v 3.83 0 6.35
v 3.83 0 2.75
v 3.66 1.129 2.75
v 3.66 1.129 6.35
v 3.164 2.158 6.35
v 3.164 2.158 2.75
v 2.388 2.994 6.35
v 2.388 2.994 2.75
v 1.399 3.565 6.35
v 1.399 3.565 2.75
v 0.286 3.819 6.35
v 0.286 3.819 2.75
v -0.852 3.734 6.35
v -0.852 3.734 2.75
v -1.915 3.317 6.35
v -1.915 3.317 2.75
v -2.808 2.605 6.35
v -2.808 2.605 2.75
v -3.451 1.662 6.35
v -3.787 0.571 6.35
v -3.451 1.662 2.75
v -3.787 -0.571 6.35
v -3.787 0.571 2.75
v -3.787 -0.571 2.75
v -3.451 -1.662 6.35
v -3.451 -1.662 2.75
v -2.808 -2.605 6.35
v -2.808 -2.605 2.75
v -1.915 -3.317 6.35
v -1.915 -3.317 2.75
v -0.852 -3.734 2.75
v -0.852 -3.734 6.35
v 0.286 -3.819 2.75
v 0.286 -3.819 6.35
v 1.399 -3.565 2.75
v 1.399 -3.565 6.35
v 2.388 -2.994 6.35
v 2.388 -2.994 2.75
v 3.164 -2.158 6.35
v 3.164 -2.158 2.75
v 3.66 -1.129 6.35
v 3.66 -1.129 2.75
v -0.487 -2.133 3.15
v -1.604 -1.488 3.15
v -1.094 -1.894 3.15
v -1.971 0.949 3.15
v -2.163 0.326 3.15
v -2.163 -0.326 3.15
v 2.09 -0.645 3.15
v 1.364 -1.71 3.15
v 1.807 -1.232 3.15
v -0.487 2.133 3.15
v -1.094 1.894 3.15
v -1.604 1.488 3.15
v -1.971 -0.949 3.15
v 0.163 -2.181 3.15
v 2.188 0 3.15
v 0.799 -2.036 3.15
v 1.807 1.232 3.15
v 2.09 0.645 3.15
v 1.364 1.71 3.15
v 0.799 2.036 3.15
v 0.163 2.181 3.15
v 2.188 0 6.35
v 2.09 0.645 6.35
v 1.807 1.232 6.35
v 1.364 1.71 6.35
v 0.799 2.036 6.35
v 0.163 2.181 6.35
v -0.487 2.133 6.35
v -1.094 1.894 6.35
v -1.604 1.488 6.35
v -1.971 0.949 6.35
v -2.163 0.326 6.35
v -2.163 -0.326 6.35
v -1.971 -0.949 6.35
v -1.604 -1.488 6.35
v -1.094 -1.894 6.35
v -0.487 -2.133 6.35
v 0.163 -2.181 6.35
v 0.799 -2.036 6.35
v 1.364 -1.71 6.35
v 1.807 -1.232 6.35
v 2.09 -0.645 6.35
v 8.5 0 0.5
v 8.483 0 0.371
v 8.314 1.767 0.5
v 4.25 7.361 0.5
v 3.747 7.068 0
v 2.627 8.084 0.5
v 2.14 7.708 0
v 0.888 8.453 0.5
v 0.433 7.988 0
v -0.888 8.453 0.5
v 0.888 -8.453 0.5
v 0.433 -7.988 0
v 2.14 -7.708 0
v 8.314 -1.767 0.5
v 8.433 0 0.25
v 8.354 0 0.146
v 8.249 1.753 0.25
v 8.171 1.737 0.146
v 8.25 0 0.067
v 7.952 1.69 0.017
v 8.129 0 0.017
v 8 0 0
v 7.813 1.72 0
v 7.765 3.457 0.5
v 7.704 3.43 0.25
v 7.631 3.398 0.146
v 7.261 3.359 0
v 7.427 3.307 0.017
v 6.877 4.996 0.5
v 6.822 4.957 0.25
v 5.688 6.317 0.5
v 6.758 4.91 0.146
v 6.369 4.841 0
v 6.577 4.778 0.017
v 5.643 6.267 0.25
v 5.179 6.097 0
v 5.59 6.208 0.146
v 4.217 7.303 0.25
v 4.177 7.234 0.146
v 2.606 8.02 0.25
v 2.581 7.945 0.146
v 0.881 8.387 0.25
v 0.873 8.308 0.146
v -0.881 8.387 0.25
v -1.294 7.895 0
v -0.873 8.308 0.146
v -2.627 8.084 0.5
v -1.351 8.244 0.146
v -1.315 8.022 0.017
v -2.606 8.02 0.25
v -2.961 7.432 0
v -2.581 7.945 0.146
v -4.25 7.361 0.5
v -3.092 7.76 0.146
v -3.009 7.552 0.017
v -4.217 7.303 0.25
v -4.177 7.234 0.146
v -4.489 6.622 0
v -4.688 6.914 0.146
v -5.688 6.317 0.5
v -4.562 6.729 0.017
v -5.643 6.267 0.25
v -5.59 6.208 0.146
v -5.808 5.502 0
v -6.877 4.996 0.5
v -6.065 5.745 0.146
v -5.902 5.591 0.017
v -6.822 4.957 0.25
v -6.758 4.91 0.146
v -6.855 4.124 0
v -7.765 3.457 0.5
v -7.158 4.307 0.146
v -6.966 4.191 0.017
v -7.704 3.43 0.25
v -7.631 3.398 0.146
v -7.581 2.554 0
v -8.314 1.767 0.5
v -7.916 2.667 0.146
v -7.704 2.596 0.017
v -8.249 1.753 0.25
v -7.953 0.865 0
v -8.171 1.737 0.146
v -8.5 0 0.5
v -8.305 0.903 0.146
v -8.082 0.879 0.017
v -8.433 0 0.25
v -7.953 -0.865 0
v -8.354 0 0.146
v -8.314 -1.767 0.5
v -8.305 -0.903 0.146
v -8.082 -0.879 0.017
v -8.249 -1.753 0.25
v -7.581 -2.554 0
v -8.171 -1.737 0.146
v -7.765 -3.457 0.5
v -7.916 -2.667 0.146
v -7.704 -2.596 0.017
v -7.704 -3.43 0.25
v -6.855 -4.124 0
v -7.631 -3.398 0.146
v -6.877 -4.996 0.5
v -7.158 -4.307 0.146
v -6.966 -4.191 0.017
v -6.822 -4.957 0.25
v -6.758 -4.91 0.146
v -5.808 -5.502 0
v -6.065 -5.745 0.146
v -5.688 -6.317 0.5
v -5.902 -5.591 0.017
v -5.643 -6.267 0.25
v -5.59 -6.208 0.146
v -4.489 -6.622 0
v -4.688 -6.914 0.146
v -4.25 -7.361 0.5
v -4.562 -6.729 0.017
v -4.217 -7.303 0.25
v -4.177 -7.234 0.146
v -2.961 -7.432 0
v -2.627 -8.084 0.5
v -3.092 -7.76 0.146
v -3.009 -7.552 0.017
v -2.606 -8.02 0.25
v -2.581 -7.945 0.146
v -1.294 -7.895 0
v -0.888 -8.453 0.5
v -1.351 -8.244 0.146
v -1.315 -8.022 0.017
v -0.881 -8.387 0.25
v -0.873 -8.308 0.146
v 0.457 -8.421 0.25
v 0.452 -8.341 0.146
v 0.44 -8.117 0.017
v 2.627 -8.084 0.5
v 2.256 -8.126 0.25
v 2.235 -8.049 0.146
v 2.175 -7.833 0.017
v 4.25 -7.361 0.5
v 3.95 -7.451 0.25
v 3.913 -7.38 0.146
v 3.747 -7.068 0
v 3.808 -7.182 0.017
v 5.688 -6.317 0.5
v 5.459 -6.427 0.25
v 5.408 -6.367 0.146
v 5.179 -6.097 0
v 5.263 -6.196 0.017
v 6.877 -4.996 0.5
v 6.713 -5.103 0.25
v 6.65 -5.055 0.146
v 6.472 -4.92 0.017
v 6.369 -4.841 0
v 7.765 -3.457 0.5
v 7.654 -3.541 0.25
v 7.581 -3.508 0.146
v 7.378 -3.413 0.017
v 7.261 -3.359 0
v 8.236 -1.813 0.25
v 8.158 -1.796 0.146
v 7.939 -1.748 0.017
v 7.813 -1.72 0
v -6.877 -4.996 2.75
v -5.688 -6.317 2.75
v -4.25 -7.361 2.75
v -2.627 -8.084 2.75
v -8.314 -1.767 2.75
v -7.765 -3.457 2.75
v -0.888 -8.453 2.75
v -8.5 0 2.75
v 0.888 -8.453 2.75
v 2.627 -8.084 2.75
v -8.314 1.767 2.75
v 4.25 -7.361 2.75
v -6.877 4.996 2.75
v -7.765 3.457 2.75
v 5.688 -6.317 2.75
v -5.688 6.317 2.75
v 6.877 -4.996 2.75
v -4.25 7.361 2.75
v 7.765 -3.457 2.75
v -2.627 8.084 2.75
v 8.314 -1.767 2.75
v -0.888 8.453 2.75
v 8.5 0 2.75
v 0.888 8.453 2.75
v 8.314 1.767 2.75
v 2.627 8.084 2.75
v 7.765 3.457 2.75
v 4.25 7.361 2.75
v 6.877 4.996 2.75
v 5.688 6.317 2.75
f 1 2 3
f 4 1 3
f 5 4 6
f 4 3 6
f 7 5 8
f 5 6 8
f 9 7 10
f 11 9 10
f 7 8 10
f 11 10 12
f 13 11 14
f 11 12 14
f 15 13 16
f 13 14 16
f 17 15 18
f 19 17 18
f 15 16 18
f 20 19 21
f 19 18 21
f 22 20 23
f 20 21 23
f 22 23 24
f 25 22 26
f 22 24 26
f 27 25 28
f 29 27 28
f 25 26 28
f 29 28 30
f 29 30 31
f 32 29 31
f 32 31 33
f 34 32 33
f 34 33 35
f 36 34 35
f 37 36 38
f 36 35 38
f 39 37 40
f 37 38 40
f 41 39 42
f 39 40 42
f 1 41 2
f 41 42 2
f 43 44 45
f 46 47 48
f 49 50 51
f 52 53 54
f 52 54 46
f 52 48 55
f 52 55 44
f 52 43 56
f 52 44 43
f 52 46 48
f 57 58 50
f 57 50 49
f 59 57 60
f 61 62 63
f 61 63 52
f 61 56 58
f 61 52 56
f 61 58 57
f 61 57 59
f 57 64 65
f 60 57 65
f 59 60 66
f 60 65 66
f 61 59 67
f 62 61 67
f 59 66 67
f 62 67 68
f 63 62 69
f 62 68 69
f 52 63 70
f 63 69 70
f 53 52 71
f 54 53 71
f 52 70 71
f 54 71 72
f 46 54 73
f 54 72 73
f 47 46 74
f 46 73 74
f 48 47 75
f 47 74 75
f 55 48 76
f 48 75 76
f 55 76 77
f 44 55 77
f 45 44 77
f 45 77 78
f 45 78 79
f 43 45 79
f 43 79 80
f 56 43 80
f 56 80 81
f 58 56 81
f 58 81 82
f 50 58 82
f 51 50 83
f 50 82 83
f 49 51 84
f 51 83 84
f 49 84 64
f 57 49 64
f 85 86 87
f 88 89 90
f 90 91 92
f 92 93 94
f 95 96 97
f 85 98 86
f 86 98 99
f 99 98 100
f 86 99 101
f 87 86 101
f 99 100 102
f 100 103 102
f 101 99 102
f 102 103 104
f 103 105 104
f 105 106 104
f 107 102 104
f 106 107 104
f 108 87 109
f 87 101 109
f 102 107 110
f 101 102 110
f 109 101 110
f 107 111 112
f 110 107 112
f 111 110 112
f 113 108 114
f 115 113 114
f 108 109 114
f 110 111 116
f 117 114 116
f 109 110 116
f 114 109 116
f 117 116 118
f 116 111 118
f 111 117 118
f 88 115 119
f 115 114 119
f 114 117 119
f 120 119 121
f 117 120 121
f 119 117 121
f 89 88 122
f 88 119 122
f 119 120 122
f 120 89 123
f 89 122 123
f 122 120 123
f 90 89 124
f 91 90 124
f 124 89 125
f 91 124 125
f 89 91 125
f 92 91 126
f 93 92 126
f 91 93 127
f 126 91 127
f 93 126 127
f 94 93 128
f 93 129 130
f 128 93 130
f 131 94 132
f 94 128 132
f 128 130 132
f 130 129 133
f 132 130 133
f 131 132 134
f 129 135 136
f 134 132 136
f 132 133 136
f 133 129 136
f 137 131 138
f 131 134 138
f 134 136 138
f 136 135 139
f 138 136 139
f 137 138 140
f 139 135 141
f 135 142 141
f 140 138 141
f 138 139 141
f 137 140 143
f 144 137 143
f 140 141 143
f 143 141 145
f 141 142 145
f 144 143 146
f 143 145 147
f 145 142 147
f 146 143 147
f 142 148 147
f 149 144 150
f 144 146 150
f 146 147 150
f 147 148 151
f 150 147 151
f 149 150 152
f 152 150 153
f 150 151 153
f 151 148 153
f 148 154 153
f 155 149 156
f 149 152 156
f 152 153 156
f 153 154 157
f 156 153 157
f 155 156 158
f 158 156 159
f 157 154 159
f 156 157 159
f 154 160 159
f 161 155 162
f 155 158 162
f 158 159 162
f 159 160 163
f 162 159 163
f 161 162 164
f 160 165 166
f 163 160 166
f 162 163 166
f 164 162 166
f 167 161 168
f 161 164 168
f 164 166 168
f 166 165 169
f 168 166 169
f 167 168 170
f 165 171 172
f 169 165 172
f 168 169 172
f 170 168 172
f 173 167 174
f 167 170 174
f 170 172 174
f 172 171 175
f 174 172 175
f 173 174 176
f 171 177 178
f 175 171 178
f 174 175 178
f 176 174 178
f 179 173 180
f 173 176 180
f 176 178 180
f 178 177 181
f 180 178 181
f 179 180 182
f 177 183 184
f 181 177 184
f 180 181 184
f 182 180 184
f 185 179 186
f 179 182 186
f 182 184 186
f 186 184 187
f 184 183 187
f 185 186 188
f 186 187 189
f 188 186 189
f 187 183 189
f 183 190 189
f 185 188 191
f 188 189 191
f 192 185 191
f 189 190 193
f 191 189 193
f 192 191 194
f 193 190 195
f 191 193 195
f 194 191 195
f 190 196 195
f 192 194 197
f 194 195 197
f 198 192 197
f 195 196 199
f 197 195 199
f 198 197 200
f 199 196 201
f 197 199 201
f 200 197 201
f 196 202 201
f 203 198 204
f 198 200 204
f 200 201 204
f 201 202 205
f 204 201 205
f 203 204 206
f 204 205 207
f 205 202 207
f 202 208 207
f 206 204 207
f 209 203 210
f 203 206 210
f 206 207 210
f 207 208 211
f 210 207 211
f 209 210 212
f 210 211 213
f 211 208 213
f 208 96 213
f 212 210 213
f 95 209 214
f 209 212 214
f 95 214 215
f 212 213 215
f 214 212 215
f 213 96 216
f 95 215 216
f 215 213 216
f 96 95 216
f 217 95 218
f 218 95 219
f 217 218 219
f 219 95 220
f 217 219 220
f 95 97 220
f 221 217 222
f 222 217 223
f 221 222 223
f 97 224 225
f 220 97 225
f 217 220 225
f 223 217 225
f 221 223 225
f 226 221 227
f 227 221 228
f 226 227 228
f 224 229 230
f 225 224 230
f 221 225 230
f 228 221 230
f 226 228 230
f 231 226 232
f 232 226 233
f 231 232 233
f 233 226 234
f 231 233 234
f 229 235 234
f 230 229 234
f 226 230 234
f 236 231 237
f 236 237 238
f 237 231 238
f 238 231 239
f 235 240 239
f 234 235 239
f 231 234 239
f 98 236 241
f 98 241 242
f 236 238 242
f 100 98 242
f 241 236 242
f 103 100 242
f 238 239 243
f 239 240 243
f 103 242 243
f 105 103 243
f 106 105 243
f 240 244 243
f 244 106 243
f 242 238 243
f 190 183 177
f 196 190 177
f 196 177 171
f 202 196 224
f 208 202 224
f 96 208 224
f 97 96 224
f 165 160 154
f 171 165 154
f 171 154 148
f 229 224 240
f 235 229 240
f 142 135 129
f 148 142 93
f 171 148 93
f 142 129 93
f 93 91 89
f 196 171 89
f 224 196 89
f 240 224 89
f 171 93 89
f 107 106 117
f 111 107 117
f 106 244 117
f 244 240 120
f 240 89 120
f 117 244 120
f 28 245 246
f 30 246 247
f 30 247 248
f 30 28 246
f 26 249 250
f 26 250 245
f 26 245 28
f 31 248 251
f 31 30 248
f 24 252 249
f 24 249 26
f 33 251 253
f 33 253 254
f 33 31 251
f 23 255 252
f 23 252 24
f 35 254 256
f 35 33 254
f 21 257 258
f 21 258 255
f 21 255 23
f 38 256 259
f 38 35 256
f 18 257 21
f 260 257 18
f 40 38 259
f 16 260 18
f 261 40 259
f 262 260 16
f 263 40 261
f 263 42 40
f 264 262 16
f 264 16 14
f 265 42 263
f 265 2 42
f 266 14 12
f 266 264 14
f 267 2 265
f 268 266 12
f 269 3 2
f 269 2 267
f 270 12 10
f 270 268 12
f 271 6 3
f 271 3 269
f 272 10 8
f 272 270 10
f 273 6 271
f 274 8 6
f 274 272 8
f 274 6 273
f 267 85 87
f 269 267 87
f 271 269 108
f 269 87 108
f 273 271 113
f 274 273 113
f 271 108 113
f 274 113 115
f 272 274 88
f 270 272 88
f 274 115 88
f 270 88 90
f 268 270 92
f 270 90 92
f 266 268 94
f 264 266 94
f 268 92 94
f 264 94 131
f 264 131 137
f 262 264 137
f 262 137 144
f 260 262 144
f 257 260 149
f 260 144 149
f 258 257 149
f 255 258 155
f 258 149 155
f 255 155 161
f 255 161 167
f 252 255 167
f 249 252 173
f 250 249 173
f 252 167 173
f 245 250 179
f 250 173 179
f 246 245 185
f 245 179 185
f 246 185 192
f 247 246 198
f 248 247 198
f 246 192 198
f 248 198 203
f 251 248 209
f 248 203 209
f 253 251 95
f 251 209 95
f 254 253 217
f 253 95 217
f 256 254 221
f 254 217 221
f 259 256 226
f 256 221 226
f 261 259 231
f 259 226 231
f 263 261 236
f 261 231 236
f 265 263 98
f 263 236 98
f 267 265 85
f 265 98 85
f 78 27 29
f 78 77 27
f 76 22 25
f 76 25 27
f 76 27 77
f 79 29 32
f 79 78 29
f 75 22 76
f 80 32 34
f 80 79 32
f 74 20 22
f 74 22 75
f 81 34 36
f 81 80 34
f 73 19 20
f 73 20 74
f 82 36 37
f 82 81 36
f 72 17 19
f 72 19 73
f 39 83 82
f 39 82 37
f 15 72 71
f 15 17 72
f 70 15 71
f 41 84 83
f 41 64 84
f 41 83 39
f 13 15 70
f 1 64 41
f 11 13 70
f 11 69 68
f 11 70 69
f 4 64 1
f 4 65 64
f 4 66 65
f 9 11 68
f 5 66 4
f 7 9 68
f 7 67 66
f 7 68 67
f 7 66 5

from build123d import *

# Parameters (mm, degrees)
F0_R     = 8.5
F1_DEPTH = 2.75
F2_R     = 3.83
F3_DEPTH = 3.6
F4_R     = 2.1875
F5_DEPTH = 3.2
F6_R     = 0.5


with BuildPart() as f1:
    # F0 (on Top) → F1 (new body)
    with BuildSketch(Plane.XY):
        Circle(F0_R)
    extrude(amount=F1_DEPTH)

    # F2 (on face) → F3 (join)
    with BuildSketch(Plane.XY.offset(2.75)):
        Circle(F2_R)
    extrude(amount=F3_DEPTH)

    # F4 (on face) → F5 (cut)
    with BuildSketch(Plane.XY.offset(6.35)):
        Circle(F4_R)
    extrude(amount=-F5_DEPTH, mode=Mode.SUBTRACT)

    # F6
    f6_edges = [f1.edges().sort_by_distance(p)[0] for p in [
        (-8.5, 0, 0),
    ]]
    fillet(f6_edges, radius=F6_R)


solid = f1.part
